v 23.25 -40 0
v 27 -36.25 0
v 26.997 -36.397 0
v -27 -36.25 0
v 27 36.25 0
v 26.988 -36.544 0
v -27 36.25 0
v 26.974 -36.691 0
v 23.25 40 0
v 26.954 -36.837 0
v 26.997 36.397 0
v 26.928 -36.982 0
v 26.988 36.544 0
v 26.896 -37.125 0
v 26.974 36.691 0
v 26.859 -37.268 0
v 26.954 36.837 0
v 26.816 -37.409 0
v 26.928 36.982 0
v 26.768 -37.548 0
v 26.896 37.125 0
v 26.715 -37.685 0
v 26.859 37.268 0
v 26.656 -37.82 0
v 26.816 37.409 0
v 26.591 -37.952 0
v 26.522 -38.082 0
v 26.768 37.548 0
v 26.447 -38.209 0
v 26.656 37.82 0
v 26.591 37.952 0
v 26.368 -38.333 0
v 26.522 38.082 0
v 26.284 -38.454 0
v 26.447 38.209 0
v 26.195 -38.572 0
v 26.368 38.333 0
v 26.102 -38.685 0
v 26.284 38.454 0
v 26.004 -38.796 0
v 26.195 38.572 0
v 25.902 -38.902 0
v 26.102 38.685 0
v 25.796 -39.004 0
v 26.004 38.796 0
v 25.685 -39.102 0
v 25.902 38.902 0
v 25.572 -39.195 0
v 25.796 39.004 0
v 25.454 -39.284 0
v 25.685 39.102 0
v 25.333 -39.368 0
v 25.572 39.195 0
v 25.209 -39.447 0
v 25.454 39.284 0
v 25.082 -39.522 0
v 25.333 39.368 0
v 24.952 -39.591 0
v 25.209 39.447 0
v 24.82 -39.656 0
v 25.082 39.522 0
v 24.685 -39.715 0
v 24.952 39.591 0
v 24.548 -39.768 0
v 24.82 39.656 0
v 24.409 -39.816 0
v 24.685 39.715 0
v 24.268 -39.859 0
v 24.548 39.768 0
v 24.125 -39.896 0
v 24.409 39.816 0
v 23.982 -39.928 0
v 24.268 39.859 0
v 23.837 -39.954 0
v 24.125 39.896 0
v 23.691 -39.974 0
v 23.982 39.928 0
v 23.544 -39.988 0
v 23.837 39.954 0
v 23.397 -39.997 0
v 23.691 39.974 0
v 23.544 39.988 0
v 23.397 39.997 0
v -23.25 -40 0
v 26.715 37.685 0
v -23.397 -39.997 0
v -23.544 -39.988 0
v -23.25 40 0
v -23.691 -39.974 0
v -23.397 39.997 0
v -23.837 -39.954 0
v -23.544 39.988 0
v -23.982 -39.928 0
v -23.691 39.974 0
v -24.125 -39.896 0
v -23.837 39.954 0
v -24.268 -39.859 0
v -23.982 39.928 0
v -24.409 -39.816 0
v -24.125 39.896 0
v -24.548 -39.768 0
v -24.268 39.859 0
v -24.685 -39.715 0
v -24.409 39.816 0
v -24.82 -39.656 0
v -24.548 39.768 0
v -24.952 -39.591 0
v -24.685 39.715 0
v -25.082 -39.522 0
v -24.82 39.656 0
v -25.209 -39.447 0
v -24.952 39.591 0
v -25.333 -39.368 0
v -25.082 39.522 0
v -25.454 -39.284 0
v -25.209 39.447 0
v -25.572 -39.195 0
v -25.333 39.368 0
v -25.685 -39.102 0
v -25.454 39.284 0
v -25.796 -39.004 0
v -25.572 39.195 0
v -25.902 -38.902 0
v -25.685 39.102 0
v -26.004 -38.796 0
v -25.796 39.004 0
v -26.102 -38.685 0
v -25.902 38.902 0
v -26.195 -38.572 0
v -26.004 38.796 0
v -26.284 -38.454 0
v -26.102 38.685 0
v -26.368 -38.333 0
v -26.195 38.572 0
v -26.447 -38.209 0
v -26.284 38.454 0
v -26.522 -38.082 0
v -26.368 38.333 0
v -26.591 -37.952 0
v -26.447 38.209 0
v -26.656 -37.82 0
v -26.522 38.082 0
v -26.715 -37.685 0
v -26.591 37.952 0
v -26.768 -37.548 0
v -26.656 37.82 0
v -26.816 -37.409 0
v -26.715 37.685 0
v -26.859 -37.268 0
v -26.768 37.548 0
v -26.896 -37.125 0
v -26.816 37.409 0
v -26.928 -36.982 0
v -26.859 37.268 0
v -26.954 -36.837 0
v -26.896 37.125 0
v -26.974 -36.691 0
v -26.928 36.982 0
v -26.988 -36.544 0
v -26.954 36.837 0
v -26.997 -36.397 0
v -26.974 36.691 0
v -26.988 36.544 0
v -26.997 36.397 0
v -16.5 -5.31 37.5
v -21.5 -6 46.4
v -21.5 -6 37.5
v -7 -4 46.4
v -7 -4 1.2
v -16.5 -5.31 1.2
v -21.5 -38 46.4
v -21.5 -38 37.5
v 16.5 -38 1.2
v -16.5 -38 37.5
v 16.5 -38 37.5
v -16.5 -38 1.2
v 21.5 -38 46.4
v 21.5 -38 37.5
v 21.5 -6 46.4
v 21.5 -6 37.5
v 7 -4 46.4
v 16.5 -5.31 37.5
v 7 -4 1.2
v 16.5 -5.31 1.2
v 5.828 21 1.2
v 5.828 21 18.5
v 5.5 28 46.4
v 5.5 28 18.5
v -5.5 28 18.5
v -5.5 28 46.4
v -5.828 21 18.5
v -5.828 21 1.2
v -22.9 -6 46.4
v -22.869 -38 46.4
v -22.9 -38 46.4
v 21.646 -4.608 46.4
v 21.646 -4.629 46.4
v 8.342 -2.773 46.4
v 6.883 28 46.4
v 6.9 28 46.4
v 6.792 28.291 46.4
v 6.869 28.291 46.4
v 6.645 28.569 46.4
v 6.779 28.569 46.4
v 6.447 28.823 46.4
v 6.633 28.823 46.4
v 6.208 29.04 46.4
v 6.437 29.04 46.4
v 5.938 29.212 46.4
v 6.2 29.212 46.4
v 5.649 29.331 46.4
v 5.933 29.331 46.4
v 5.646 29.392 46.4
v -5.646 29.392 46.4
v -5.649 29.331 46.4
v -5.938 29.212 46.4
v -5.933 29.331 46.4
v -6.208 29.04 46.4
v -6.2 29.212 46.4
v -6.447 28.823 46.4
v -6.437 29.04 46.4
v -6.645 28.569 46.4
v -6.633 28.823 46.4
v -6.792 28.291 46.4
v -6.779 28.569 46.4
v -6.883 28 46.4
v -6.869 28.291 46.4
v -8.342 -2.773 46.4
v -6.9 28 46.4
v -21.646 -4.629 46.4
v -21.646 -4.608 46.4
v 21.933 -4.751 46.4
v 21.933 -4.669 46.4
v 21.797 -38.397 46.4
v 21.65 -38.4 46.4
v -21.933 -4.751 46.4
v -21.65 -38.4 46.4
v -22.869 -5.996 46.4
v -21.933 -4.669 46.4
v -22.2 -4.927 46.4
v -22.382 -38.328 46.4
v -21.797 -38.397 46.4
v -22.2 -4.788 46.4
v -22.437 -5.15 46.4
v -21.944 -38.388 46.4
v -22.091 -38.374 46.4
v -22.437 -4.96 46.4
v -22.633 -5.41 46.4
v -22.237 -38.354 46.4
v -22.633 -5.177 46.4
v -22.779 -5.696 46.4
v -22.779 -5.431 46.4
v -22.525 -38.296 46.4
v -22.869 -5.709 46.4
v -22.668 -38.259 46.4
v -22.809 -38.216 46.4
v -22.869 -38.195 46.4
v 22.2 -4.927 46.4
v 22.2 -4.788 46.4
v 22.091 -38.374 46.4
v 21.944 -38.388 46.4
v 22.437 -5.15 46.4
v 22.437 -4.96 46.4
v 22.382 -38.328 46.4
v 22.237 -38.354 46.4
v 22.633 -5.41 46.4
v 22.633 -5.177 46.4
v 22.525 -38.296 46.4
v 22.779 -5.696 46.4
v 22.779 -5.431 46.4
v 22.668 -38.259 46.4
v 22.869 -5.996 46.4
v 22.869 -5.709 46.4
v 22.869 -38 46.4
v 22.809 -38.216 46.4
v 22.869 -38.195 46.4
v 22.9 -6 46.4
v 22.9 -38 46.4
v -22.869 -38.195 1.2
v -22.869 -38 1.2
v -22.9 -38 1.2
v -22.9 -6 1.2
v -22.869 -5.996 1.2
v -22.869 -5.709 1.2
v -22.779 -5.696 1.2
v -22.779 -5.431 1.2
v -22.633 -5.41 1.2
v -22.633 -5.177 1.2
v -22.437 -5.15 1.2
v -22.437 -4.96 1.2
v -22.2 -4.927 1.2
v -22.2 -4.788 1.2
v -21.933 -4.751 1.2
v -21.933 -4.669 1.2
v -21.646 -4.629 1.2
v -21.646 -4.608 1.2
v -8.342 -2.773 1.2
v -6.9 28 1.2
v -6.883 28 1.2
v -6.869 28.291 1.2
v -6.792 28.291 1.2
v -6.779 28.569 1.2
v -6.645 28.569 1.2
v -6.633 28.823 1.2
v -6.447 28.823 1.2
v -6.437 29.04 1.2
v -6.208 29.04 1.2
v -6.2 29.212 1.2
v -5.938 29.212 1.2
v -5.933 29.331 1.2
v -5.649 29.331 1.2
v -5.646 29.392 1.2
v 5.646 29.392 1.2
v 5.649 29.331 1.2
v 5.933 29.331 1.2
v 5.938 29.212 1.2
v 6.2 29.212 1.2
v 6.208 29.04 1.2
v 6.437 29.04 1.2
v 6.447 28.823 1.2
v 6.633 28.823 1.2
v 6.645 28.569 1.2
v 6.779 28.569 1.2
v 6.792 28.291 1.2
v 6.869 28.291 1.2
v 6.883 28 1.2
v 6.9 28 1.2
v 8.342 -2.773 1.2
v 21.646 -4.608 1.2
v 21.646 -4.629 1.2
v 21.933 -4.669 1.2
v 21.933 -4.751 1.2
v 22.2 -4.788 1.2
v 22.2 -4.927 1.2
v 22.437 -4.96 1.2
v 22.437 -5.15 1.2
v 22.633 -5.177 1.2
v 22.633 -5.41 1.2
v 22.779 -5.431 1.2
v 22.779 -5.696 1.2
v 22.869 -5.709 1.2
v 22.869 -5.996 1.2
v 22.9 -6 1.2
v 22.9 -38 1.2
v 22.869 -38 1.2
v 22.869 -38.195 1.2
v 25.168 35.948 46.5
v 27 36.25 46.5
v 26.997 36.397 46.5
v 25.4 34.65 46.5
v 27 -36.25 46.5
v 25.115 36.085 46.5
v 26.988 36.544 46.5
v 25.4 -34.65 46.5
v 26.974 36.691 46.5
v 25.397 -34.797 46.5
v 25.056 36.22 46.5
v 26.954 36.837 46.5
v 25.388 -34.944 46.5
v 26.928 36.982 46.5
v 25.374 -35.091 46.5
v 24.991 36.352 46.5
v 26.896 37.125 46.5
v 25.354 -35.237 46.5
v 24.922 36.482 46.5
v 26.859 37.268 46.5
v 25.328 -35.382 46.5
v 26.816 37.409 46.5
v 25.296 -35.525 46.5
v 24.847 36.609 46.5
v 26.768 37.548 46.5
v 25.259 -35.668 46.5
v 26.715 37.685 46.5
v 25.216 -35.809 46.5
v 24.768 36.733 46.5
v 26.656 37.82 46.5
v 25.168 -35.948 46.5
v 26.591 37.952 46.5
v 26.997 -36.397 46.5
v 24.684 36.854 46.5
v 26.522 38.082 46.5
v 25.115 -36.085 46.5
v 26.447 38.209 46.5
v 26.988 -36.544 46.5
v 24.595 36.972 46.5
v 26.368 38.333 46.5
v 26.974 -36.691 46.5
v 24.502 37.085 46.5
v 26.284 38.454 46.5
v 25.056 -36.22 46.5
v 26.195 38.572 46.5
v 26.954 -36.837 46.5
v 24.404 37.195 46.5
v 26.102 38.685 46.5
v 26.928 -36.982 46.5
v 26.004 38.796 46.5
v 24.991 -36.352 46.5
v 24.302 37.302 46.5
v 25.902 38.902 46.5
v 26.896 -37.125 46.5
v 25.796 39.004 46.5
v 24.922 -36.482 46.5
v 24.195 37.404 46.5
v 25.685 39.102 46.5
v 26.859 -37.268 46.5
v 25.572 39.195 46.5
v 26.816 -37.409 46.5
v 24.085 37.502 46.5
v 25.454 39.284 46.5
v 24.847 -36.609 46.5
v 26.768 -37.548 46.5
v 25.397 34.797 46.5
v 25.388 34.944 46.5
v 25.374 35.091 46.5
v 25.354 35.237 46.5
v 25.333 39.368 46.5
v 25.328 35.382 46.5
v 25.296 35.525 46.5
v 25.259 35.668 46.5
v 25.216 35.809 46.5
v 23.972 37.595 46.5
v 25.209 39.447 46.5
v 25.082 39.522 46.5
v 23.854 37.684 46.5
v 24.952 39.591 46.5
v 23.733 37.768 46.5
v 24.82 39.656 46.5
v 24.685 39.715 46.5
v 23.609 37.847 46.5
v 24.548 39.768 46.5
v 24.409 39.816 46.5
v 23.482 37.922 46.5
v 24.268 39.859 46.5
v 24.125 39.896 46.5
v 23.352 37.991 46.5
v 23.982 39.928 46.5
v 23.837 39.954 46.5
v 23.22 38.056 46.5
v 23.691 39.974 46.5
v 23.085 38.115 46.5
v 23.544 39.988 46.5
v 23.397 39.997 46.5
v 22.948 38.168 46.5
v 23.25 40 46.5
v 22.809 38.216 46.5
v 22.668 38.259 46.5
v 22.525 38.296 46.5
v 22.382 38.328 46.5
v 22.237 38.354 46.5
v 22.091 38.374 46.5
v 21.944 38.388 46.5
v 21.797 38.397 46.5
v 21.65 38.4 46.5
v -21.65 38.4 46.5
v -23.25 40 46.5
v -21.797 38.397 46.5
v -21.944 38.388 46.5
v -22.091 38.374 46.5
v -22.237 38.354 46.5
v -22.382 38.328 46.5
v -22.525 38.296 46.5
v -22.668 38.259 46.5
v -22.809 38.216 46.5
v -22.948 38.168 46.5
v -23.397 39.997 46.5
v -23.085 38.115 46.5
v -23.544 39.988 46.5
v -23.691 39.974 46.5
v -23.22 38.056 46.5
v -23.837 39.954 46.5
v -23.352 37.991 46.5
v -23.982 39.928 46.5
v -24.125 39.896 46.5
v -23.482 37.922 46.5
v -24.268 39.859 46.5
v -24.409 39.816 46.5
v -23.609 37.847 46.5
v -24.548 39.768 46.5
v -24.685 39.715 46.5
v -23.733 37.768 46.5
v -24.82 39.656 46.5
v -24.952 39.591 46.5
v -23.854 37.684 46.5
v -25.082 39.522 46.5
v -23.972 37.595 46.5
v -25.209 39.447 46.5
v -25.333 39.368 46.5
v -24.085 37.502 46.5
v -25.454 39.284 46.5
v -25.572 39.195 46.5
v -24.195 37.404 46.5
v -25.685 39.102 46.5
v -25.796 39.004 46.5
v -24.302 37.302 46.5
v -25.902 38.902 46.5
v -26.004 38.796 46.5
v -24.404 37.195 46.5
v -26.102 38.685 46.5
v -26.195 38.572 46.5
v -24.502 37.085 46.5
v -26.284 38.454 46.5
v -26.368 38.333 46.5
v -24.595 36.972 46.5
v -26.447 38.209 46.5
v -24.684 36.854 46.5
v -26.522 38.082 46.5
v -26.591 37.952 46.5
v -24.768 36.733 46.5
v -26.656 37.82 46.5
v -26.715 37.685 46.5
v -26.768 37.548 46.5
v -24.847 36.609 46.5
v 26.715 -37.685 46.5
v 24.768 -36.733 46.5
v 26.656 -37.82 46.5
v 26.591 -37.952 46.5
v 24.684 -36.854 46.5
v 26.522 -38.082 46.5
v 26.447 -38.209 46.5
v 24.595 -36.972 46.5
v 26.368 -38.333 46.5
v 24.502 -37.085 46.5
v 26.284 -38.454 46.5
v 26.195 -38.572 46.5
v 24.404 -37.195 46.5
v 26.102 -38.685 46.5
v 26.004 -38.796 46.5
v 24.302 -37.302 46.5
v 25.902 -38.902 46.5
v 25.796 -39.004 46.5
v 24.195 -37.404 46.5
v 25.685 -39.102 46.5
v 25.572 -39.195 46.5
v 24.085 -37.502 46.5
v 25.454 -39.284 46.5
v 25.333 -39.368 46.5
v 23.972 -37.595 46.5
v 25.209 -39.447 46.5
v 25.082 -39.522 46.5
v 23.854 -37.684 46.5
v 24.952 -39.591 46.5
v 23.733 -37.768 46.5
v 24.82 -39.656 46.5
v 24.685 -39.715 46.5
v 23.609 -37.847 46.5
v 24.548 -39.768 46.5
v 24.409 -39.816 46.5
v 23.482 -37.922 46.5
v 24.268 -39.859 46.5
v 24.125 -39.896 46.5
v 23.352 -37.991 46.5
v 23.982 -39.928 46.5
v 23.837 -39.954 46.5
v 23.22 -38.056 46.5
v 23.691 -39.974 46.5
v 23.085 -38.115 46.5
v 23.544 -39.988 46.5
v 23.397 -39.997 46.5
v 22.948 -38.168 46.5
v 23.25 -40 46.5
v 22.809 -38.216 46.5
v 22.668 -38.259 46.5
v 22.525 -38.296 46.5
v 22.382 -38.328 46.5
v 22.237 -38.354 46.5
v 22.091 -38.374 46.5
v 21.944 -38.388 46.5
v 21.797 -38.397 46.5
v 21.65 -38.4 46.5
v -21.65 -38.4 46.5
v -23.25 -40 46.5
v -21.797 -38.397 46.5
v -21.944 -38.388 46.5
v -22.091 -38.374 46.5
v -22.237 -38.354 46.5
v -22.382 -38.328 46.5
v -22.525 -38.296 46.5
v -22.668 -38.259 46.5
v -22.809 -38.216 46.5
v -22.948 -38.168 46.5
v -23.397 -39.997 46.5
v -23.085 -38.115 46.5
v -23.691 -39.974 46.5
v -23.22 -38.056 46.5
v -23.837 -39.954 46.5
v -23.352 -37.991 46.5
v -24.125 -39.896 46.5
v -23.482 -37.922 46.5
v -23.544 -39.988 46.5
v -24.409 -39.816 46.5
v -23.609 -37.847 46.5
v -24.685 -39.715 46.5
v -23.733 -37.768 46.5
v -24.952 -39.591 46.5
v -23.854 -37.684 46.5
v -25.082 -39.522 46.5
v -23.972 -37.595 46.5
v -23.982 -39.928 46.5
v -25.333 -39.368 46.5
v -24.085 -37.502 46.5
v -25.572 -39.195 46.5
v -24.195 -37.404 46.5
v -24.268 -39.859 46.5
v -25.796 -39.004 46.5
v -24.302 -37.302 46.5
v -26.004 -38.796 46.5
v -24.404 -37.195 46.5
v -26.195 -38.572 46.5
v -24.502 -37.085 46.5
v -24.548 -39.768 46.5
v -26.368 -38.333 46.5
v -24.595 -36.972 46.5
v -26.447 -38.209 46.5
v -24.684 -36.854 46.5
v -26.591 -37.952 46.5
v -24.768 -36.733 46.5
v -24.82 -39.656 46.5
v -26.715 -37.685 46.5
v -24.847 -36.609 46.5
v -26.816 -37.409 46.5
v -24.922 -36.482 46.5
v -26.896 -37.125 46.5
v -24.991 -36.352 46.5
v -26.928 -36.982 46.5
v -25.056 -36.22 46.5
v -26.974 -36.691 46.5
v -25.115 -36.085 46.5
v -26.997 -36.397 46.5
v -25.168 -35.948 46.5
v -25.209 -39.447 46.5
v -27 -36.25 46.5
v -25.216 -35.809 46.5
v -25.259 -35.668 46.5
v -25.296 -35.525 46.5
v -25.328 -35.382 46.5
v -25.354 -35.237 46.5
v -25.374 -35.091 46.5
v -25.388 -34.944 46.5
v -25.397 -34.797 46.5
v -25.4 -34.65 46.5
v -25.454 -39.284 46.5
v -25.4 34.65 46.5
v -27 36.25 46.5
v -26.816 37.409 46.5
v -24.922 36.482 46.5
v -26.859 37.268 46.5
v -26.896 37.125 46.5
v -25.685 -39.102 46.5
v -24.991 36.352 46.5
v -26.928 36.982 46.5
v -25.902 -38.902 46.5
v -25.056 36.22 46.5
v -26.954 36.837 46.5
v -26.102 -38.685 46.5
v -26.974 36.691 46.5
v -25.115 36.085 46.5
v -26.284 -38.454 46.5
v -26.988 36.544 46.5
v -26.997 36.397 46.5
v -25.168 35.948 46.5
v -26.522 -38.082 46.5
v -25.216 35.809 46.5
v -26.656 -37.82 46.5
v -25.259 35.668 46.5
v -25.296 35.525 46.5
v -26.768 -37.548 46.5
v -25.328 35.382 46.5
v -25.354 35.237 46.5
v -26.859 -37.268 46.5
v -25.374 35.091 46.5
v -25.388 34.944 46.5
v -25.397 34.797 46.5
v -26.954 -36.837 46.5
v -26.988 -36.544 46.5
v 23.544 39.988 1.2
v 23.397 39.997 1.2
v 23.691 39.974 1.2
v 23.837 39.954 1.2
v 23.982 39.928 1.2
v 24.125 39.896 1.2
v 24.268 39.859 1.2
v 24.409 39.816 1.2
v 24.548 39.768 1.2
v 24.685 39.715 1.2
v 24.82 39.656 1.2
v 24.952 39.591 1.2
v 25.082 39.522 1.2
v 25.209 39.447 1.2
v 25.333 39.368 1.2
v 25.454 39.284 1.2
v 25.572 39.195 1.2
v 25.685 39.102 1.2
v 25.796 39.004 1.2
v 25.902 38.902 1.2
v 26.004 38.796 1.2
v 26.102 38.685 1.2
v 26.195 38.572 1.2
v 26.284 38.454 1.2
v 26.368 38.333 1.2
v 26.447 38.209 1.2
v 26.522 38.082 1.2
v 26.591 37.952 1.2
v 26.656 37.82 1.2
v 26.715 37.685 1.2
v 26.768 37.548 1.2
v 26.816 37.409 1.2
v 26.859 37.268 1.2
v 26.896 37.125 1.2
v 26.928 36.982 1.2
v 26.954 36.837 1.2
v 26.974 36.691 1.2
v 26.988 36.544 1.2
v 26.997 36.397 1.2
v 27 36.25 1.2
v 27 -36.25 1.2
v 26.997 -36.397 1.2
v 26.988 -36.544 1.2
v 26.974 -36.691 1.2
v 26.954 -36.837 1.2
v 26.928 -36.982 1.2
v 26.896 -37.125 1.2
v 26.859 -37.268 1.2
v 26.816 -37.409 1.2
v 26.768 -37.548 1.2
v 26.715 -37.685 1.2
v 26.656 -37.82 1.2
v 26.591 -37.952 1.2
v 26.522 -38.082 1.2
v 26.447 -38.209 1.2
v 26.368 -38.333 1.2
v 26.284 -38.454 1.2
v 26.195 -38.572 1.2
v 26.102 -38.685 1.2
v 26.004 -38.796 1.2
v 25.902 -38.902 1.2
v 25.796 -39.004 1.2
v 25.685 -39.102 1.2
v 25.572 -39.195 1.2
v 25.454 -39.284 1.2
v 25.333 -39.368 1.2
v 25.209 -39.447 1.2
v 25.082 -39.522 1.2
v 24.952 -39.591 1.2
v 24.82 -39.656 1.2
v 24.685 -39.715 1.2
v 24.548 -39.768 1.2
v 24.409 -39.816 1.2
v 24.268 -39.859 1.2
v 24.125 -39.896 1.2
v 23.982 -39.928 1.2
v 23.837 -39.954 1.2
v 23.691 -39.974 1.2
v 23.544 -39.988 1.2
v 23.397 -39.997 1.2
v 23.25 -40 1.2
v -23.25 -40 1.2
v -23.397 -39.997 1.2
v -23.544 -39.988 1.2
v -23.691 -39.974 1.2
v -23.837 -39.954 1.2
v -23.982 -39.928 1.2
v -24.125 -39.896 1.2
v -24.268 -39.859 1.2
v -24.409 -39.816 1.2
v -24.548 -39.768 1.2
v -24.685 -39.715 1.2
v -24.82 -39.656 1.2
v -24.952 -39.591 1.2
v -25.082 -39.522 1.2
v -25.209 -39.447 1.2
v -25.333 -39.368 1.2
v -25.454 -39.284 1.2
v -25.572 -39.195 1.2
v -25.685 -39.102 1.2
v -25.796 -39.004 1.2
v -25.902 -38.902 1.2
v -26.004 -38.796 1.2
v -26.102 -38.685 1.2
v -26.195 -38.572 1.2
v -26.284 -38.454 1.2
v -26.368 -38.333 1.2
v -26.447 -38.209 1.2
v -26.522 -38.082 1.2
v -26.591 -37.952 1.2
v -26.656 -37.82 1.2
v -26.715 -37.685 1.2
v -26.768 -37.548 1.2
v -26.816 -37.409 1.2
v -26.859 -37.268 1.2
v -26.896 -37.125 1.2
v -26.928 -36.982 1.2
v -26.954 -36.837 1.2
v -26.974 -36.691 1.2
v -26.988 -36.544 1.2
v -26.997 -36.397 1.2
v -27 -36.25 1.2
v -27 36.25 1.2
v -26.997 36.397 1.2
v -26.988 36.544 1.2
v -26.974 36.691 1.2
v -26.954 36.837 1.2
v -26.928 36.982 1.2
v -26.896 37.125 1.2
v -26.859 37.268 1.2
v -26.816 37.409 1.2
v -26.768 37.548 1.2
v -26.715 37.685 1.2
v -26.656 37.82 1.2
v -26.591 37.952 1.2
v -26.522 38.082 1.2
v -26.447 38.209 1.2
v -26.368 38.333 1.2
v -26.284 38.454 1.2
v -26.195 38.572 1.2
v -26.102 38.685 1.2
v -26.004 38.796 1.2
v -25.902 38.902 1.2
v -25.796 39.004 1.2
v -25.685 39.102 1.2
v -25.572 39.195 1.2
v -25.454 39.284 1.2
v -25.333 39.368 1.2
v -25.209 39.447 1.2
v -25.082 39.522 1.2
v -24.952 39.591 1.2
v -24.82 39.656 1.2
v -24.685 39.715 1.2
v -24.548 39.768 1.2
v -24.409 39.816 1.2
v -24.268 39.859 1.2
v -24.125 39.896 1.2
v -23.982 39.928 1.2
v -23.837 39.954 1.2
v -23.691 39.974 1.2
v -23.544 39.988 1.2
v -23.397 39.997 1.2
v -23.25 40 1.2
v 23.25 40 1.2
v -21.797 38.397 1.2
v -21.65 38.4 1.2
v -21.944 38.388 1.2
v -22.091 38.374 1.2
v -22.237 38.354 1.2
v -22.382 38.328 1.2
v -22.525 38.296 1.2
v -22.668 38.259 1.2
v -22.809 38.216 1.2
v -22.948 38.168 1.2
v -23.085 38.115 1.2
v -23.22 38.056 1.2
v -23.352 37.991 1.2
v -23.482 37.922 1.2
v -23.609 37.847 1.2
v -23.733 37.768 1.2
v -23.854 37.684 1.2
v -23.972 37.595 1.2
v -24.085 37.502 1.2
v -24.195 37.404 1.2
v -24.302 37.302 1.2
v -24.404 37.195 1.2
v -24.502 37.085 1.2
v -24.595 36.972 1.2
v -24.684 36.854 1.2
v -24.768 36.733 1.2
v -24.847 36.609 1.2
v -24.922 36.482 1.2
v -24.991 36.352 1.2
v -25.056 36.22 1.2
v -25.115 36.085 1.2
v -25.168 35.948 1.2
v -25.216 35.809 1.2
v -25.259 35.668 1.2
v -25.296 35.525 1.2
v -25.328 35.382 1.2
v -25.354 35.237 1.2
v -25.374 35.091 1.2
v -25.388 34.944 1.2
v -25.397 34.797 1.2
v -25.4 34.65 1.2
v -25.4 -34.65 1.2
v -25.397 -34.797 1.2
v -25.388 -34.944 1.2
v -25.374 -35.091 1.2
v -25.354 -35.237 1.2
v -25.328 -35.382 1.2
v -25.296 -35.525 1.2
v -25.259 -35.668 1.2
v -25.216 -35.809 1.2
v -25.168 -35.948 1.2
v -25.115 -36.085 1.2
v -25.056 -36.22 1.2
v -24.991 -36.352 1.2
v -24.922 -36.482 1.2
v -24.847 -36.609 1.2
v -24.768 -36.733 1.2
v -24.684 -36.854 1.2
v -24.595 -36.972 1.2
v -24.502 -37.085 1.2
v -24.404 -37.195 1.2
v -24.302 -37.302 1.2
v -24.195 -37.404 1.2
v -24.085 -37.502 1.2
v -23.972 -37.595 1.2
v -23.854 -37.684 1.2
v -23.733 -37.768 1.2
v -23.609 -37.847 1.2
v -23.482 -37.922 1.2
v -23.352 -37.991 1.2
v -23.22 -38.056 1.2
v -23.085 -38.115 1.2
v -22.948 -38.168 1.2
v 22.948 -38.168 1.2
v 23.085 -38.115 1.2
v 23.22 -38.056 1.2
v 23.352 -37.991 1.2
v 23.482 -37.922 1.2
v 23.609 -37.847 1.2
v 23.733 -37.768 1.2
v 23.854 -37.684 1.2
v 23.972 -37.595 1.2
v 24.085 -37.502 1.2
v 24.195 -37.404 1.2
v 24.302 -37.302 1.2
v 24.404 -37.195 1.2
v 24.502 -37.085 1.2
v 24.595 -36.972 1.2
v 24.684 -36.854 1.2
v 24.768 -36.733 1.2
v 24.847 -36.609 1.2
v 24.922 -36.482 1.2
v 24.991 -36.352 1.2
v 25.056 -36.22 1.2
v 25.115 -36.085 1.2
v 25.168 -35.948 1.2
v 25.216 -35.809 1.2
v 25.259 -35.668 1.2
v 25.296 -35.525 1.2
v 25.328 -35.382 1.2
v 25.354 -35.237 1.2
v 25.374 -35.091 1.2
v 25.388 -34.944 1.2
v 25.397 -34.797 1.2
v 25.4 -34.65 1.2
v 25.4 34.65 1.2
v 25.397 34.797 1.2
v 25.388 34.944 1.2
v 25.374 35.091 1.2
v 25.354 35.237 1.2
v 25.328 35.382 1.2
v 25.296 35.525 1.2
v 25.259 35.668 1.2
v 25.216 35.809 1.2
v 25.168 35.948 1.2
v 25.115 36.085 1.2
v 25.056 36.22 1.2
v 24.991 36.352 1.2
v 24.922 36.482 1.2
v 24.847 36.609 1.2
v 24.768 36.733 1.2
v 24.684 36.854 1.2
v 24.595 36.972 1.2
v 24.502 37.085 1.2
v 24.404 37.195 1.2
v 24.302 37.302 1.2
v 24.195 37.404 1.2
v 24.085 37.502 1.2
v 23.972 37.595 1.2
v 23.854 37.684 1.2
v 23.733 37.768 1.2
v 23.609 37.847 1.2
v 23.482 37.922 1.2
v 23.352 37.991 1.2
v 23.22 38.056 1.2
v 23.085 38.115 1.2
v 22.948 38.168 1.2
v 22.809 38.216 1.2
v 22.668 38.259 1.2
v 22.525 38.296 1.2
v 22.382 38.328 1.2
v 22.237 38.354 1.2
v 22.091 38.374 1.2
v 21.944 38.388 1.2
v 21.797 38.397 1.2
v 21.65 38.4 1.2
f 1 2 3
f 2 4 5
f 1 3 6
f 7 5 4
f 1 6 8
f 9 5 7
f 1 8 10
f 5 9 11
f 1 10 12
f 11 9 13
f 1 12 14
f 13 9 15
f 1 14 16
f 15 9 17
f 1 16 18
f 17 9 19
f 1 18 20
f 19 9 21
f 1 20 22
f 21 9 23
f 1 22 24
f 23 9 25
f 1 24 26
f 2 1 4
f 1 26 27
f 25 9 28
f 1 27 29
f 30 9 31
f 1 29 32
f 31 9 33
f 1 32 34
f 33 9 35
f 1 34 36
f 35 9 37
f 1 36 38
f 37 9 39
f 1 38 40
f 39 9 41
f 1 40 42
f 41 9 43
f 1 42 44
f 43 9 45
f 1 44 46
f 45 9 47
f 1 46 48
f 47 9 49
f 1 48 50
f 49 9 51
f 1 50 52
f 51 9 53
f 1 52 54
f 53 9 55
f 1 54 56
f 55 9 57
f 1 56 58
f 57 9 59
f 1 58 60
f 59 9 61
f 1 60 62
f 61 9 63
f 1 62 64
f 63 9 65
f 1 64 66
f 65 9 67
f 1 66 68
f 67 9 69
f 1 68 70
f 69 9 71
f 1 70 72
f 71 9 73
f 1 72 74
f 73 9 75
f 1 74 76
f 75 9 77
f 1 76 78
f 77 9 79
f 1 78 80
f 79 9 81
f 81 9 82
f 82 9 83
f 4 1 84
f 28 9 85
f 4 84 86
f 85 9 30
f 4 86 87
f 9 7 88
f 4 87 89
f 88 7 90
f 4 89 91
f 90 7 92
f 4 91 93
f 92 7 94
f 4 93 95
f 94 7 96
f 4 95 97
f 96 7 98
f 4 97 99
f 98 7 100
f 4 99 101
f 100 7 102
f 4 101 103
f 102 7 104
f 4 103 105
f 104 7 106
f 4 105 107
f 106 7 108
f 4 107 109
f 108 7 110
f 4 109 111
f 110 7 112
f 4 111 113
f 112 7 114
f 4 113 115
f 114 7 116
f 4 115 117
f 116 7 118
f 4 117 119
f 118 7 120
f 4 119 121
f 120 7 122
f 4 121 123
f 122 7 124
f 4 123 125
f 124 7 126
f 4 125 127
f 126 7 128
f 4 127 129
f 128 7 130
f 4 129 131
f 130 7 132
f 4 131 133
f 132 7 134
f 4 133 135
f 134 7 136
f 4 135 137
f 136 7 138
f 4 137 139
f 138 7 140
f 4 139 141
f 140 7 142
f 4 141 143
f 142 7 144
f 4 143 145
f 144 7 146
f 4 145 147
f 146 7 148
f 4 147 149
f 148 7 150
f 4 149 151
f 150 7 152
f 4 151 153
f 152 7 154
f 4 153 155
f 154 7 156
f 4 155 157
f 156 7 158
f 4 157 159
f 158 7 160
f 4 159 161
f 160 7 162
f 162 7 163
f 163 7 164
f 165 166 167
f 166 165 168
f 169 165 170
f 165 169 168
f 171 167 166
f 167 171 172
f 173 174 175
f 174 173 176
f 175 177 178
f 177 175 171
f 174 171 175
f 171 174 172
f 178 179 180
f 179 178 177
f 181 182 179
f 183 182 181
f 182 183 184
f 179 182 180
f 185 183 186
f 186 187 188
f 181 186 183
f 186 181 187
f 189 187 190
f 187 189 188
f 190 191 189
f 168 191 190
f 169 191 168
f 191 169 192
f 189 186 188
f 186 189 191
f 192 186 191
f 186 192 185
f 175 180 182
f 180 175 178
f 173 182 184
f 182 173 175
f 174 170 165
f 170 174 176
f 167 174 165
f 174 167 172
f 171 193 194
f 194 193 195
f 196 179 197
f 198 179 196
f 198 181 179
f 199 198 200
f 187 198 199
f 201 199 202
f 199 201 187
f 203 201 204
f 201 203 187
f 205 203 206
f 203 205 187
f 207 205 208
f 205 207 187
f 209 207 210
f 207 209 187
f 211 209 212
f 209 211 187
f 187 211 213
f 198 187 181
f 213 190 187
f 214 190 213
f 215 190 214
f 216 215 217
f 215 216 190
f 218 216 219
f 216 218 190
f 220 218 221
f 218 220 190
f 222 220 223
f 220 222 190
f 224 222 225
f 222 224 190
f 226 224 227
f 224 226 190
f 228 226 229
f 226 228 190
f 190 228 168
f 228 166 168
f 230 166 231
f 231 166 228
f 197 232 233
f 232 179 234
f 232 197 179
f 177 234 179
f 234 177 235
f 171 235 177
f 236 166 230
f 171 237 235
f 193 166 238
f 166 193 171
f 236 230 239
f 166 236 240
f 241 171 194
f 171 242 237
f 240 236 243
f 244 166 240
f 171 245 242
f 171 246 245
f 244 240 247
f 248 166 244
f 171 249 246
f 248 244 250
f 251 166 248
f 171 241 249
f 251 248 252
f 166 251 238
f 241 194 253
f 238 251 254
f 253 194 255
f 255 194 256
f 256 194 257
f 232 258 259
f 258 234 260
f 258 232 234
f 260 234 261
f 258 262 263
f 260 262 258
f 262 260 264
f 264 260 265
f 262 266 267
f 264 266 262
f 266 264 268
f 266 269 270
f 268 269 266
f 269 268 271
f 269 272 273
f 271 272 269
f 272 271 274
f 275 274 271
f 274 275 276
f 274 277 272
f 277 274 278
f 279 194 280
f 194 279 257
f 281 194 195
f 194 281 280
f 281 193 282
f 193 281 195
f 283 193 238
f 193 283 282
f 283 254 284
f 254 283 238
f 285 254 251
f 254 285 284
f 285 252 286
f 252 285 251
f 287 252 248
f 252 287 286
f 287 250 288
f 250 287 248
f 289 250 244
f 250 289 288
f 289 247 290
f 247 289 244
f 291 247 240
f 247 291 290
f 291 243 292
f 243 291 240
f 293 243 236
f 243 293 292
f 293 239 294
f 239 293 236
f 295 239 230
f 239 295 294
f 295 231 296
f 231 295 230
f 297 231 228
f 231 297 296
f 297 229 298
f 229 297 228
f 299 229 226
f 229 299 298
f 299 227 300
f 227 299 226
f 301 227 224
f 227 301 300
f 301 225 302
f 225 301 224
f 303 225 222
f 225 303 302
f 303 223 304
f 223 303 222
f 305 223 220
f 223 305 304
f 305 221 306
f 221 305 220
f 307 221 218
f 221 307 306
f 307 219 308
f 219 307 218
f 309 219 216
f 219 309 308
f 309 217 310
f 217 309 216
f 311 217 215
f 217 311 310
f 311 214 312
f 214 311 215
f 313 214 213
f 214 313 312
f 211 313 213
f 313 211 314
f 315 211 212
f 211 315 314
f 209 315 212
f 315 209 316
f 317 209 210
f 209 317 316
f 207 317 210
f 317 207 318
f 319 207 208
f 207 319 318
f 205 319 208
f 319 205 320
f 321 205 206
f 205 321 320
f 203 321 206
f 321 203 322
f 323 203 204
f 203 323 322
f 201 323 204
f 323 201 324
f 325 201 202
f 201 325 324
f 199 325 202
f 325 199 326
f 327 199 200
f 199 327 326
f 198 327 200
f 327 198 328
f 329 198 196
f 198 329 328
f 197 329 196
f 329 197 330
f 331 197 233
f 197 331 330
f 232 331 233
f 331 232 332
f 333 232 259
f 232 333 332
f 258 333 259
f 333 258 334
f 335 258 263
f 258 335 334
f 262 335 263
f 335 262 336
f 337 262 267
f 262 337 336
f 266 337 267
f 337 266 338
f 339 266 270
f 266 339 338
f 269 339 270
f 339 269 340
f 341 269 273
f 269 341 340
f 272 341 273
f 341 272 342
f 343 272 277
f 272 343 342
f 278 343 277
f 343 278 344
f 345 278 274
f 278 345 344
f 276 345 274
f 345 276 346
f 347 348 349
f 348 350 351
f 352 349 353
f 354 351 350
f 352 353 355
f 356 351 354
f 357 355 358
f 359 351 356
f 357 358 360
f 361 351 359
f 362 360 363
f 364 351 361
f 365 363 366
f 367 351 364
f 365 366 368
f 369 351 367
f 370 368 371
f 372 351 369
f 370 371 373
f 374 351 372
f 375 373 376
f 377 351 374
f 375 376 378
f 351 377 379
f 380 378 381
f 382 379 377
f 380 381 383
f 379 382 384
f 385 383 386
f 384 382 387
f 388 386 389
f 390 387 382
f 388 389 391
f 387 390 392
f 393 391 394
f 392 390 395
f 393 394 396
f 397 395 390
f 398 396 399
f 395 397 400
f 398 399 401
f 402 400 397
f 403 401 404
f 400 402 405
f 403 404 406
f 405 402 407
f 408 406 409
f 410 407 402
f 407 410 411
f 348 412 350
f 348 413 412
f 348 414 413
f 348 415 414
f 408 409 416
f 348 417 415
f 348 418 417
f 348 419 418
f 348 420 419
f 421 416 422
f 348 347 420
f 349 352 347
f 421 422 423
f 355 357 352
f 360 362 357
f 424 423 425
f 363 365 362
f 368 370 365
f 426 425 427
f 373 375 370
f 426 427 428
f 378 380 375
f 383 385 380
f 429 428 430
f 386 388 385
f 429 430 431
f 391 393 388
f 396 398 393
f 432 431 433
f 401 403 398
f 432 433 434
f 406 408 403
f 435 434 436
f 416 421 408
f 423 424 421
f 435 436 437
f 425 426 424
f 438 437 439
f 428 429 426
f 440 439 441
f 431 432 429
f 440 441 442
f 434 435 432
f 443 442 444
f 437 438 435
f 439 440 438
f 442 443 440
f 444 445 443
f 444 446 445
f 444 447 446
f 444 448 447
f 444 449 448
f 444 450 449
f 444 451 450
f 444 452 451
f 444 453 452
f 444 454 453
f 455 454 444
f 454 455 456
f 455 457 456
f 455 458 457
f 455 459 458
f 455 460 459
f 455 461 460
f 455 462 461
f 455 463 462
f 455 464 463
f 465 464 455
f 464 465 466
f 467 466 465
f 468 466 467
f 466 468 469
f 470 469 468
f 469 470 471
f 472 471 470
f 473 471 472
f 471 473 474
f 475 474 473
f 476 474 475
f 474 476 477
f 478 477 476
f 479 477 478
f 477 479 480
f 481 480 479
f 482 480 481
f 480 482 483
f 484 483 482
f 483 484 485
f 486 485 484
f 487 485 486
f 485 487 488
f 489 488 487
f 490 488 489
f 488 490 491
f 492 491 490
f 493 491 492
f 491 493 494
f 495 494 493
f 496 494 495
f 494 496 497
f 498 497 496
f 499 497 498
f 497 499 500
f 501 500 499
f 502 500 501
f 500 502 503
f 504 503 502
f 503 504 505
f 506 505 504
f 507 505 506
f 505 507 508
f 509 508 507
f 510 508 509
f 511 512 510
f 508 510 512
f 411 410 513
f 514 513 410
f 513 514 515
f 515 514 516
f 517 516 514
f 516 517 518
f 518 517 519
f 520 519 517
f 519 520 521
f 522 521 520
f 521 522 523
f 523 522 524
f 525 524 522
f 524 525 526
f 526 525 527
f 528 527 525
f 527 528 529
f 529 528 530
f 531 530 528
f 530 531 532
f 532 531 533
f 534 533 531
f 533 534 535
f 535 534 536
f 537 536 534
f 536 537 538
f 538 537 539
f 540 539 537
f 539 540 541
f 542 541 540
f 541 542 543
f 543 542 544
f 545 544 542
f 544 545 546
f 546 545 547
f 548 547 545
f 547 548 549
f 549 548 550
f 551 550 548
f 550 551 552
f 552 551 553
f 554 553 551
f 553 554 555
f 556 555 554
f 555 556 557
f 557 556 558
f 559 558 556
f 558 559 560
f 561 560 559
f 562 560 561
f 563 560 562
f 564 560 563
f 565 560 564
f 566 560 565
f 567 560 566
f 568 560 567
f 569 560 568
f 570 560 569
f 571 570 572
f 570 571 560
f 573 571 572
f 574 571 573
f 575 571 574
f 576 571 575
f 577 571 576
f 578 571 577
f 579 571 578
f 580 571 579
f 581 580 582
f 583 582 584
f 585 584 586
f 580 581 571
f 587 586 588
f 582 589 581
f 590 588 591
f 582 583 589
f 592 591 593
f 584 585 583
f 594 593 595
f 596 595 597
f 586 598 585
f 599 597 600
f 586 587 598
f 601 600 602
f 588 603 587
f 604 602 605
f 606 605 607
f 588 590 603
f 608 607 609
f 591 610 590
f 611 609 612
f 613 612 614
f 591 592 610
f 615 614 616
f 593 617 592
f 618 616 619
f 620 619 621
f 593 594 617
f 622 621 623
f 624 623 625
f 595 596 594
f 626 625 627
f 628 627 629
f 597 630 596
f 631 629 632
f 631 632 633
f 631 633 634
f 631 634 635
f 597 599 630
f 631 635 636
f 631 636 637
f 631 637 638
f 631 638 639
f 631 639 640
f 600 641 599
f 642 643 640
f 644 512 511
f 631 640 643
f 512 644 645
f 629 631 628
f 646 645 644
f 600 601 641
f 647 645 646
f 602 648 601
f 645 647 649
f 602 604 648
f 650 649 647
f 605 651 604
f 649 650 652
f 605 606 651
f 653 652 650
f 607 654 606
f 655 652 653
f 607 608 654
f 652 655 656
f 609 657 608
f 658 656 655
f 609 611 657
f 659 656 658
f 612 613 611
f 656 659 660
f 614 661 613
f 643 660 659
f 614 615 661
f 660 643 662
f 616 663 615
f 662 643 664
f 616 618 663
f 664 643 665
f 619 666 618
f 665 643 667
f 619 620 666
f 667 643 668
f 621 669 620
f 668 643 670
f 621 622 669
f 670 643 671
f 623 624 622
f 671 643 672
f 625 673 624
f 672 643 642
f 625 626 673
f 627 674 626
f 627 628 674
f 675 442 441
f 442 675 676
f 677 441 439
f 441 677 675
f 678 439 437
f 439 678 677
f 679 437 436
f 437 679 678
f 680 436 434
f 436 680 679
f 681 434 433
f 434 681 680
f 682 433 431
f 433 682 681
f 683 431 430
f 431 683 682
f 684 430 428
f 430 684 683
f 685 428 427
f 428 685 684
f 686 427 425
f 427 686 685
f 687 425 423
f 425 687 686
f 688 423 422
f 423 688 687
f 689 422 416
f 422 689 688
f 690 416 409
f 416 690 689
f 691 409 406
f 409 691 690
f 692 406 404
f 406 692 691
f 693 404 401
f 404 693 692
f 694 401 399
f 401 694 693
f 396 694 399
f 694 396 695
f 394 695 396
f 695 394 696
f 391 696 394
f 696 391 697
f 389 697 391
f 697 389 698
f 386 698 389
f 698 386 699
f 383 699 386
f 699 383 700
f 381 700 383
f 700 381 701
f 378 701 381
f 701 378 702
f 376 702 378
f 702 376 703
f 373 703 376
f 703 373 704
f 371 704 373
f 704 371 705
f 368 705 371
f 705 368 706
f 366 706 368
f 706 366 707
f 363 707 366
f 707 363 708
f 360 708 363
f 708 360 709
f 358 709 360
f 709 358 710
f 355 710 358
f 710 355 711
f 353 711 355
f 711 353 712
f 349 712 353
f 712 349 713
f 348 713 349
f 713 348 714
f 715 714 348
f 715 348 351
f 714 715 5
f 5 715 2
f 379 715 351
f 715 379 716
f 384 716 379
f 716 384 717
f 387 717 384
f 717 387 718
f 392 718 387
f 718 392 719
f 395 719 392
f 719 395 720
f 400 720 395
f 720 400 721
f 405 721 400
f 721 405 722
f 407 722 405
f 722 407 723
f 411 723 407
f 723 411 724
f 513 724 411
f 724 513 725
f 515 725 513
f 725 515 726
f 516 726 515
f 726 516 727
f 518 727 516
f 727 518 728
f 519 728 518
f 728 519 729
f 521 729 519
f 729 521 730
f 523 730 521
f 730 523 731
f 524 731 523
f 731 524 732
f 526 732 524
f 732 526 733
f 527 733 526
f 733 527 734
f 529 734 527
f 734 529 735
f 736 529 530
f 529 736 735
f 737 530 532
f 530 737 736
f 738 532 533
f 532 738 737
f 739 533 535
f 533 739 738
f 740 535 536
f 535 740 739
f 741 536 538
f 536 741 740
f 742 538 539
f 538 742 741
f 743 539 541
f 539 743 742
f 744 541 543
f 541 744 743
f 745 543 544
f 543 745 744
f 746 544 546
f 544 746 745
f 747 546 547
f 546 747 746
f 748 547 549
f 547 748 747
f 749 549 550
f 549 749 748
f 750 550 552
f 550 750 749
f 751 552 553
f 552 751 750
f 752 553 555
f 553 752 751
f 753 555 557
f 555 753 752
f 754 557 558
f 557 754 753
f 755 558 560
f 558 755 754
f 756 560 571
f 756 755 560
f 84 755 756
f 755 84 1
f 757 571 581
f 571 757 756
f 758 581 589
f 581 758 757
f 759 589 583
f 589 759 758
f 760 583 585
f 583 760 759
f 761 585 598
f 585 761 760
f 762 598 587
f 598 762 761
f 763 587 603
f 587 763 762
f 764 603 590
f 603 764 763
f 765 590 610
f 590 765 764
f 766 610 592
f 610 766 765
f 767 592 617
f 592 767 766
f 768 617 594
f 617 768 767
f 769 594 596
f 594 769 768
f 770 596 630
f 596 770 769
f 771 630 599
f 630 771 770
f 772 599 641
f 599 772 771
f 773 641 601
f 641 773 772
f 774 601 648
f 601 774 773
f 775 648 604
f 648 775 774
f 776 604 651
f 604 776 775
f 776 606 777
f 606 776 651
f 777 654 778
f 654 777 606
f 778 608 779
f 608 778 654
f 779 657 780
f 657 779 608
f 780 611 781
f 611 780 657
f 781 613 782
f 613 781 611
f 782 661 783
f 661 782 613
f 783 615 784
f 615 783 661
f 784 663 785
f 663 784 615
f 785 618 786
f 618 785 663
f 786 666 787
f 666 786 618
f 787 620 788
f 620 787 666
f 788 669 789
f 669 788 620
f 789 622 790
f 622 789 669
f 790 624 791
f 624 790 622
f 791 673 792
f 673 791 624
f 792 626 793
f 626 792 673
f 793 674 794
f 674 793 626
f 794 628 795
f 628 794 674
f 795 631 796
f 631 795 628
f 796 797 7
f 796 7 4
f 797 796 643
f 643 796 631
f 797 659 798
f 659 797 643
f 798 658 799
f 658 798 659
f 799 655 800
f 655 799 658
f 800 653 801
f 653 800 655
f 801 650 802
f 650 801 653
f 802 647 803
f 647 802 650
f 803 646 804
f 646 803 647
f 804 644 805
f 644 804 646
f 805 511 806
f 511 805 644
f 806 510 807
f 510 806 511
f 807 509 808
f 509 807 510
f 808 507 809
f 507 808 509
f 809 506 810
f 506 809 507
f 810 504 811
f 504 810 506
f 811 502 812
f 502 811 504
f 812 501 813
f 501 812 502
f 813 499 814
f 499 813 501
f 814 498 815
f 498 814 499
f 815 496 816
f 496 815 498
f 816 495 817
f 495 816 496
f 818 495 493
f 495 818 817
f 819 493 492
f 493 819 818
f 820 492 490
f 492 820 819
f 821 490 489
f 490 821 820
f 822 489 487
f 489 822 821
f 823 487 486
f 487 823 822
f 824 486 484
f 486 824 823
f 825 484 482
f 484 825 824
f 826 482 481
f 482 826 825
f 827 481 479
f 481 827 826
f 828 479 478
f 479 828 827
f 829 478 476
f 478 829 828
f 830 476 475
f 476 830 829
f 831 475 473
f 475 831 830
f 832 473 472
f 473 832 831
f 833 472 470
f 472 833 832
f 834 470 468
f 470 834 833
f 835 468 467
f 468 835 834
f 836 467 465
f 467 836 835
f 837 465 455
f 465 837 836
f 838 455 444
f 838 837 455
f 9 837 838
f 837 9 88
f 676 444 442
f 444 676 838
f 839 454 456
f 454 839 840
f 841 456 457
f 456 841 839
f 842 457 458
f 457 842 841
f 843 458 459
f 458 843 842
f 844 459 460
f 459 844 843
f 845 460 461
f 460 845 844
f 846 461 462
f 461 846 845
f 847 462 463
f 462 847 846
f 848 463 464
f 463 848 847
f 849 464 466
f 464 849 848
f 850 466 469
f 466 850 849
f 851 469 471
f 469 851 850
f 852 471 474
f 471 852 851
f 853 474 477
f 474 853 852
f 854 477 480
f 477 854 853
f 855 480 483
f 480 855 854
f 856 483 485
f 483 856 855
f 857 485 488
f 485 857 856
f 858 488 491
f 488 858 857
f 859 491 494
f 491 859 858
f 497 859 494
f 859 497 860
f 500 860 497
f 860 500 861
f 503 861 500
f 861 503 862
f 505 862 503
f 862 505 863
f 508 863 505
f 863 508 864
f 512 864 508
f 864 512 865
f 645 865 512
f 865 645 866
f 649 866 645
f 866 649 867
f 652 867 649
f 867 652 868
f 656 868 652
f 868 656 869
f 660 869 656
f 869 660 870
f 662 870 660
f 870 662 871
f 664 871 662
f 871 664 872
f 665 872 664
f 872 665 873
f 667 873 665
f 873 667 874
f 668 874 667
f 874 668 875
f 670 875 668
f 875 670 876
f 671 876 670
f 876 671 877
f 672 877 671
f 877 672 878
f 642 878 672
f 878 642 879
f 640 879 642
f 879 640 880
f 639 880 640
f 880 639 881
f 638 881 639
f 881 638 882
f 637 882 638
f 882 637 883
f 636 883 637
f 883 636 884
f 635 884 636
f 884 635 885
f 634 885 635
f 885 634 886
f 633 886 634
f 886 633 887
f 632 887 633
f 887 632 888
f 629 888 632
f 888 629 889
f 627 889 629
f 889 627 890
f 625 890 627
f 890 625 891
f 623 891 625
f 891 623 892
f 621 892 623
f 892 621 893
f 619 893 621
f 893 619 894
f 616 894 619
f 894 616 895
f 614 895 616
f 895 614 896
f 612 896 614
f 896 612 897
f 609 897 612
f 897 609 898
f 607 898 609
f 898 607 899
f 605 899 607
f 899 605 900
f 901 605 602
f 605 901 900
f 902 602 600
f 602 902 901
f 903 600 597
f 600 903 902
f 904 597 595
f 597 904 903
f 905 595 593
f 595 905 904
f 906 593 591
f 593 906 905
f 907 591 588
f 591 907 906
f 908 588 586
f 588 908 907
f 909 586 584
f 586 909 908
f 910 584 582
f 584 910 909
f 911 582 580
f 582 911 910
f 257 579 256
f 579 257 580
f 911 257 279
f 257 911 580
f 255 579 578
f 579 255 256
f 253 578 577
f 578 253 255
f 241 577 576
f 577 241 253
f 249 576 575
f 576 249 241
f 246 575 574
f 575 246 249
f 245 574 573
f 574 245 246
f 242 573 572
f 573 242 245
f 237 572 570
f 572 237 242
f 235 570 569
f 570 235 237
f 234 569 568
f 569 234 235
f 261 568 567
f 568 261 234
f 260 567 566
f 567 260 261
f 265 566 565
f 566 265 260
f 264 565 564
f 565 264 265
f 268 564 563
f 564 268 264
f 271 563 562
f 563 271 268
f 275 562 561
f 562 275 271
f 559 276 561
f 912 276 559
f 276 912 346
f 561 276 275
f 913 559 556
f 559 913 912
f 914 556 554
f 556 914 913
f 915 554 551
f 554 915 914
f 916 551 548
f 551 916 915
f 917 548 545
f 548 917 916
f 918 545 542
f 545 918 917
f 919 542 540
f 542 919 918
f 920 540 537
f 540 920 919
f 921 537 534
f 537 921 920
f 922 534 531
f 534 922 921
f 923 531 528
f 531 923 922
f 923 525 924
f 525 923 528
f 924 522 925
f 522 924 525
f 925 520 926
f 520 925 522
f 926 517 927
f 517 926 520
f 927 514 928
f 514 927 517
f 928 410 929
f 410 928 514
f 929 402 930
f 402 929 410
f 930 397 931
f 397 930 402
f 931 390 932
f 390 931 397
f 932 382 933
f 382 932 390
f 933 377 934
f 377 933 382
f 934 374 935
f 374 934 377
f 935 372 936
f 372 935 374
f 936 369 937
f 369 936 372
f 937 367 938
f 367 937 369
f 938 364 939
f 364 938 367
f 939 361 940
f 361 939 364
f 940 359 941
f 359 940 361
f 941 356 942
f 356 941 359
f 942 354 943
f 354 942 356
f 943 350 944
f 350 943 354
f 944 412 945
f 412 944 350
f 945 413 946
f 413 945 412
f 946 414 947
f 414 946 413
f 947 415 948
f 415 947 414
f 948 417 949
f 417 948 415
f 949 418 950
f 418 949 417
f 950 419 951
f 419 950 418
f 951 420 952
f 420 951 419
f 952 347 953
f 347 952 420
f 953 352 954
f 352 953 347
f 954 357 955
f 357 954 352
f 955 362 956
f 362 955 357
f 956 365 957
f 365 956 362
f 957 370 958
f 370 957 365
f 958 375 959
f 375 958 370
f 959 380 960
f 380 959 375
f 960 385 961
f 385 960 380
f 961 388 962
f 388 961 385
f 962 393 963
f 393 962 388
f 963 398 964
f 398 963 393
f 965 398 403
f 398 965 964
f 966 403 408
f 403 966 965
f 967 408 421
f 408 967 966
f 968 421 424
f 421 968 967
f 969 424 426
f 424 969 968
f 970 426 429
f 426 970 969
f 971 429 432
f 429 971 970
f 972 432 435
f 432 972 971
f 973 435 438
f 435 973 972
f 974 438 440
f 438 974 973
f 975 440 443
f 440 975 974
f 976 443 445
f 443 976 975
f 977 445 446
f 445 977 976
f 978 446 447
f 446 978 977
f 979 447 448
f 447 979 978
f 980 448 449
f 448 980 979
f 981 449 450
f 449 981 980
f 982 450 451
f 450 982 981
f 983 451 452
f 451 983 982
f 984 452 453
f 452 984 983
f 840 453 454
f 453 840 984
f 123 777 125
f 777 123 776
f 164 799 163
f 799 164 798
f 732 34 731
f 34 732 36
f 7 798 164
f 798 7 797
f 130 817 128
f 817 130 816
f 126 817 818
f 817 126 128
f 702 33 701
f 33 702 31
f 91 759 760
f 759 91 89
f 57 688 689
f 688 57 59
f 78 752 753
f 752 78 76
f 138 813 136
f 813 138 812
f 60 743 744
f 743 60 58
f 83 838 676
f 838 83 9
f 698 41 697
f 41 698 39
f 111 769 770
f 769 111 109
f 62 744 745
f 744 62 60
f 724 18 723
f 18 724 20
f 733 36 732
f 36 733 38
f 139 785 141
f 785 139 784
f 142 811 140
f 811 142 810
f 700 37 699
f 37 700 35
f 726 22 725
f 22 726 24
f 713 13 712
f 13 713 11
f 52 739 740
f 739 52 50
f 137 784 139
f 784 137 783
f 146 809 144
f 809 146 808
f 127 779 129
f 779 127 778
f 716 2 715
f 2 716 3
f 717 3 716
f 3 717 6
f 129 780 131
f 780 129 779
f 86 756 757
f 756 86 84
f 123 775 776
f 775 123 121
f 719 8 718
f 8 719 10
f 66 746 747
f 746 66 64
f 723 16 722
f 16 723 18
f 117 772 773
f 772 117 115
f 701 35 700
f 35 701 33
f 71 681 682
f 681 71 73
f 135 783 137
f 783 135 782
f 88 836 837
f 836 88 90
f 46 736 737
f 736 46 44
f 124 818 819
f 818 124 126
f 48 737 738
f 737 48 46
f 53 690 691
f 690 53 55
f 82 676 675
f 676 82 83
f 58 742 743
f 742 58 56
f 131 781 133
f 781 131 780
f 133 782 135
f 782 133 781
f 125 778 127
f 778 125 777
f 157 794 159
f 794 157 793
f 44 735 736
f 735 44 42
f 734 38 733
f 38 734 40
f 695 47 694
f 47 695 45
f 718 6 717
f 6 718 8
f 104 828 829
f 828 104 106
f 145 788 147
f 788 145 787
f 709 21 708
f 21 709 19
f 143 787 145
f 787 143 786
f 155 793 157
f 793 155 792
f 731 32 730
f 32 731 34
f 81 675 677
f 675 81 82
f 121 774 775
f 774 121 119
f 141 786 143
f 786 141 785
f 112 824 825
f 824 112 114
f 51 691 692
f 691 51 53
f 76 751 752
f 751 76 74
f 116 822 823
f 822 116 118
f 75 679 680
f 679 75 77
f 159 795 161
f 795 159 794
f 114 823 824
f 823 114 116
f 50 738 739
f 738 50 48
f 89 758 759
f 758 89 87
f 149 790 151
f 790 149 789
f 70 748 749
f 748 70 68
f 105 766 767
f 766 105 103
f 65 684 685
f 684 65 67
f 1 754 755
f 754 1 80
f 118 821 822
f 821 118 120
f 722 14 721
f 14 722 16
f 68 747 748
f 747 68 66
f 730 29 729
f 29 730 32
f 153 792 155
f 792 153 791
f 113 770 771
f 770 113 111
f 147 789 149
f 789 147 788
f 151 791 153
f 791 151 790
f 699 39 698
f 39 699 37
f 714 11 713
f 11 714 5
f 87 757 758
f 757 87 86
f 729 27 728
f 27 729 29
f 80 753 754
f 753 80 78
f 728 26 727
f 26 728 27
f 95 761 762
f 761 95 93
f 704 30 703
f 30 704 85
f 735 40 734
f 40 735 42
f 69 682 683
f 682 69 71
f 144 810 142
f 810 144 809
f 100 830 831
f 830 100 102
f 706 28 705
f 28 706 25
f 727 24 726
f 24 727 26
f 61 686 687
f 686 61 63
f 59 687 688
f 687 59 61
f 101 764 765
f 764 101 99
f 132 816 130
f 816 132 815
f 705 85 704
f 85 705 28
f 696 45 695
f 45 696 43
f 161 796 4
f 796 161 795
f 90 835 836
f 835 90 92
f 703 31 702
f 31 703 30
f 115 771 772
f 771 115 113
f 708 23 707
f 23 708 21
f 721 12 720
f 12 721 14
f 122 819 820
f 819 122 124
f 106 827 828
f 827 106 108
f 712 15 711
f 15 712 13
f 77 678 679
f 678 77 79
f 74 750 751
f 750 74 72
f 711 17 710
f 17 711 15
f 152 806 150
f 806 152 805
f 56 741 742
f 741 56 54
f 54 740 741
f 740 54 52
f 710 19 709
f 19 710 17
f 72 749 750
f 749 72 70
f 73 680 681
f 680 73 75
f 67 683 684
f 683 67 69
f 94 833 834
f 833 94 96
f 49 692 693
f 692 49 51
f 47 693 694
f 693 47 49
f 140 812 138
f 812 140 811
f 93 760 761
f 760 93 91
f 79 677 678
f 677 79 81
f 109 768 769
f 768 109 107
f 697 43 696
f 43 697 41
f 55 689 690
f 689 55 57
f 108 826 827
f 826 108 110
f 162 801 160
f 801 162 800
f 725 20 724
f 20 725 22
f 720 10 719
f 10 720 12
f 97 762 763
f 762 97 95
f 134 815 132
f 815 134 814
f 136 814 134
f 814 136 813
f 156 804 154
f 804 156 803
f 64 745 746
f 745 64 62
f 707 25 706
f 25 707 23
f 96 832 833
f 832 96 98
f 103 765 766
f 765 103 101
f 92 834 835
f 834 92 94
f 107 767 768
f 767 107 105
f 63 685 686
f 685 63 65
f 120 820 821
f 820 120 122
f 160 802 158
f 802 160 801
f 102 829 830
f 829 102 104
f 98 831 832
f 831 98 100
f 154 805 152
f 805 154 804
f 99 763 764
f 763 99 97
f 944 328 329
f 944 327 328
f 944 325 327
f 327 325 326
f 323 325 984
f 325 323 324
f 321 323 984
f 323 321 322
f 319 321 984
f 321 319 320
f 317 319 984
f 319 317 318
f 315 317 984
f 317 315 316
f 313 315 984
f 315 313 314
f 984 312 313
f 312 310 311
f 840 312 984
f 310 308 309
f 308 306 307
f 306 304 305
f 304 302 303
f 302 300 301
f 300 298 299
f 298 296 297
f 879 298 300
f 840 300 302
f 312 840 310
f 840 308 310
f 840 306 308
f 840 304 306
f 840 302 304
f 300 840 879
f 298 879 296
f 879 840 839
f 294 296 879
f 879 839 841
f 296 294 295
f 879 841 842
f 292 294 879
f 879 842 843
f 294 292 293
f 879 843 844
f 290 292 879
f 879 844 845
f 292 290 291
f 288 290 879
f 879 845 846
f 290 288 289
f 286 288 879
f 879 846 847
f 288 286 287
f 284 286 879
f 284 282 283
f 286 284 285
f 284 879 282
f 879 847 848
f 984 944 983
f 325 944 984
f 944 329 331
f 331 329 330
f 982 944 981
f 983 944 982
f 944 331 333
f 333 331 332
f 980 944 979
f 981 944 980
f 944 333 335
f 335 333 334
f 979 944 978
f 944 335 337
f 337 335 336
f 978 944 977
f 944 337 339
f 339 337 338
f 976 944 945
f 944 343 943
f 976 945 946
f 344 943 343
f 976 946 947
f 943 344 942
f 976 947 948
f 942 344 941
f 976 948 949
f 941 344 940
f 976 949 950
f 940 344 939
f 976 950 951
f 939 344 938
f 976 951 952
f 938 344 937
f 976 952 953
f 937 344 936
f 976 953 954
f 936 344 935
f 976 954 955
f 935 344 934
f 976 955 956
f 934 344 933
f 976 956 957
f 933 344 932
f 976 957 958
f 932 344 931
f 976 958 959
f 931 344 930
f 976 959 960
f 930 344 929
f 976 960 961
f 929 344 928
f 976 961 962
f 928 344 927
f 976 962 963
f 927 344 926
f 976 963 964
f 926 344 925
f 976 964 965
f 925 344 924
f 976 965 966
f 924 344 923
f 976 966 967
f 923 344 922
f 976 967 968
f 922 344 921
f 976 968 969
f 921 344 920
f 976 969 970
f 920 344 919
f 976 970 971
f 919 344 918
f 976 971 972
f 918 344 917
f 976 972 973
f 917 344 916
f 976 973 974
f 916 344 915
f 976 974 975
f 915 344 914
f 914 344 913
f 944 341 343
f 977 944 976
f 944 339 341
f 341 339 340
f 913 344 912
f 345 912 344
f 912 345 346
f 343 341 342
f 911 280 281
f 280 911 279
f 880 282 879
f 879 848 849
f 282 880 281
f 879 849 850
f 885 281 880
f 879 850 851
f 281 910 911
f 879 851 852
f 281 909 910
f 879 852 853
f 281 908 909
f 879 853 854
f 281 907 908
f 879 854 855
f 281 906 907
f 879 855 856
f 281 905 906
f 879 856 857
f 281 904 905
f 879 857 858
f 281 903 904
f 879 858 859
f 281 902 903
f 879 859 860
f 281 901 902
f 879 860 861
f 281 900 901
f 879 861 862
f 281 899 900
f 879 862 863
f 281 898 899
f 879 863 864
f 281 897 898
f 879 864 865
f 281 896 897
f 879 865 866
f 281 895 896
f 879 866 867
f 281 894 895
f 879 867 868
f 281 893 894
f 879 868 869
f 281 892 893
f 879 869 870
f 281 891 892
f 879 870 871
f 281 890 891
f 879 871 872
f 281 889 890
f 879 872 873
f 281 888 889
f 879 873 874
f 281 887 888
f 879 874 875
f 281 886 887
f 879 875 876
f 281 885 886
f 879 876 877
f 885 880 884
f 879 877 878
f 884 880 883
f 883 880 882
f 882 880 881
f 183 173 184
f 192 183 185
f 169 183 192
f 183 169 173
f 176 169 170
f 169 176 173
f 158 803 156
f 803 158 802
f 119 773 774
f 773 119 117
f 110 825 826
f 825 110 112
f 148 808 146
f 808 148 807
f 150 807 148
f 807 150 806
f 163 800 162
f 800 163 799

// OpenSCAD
/* misthunter-bin.scad
 *
 * Copyright (C) Robert B. Ross, 2016
 *
 * This software is released under the Creative Commons
 * Attribution-ShareAlike 4.0 International Public License.
 */

include <./bintools.scad>

$fn=160;
binHeight   = 46.5;
angle=0;

/* locations is a pair of triples, translate : rotate pairs
 */
locations = [[[0,5,0]]];

harborFreightMediumFullHt(locations,inset=1) misthunterBlank();

// misthunterBlank(centerCutout=0);
// misthunterOutline();

/* misthunterOutline() -- test piece for outline
 */
module misthunterOutline() {
   translate([0,0,40]) rotate([180,0,0]) {
      blankCutout(height=31 - 0.1, outlineScale=1.2) misthunterBlank();
   }
}

module misthunterBlank(centerCutout=1) {
   blankHeight = 36; 

   if (centerCutout) {
      rotate([180,0,0]) translate([0,0,-binHeight]) difference() {
         linear_extrude(height=binHeight) misthunterShell();
         translate([-7.5,26,0]) cube([15,8,8+binHeight-blankHeight]);
         translate([16.5,-33.1,0]) cube([6,34,27+binHeight-blankHeight]);
         translate([-16.5-6,-33.1,0]) cube([6,34,27+binHeight-blankHeight]);
      }
   }
   else {
      rotate([180,0,0]) translate([0,0,-blankHeight]) difference() {
         linear_extrude(height=blankHeight) misthunterShell();
         translate([-7.5,26,0]) cube([15,8,8]);
         translate([16.5,-33.1,0]) cube([6,34,27]);
         translate([-16.5-6,-33.1,0]) cube([6,34,27]);
      }
   }
}

/* misthunterShell() -- outline, adapted from some other model */
module misthunterShell() {
   for (i=[0:1]) mirror([i,0,0]) 
      translate([0,-33,0]) 
      polygon(points=[[-0.1,0],[21.5,0],[21.5,32],[7,34],[5.5,66],[-0.1,66]]);
}

/*
 * Local variables:
 *  mode: C
 *  c-indent-level: 3
 *  c-basic-offset: 3
 * End:
 *
 * vim: ts=8 sts=3 sw=3 expandtab
 */
